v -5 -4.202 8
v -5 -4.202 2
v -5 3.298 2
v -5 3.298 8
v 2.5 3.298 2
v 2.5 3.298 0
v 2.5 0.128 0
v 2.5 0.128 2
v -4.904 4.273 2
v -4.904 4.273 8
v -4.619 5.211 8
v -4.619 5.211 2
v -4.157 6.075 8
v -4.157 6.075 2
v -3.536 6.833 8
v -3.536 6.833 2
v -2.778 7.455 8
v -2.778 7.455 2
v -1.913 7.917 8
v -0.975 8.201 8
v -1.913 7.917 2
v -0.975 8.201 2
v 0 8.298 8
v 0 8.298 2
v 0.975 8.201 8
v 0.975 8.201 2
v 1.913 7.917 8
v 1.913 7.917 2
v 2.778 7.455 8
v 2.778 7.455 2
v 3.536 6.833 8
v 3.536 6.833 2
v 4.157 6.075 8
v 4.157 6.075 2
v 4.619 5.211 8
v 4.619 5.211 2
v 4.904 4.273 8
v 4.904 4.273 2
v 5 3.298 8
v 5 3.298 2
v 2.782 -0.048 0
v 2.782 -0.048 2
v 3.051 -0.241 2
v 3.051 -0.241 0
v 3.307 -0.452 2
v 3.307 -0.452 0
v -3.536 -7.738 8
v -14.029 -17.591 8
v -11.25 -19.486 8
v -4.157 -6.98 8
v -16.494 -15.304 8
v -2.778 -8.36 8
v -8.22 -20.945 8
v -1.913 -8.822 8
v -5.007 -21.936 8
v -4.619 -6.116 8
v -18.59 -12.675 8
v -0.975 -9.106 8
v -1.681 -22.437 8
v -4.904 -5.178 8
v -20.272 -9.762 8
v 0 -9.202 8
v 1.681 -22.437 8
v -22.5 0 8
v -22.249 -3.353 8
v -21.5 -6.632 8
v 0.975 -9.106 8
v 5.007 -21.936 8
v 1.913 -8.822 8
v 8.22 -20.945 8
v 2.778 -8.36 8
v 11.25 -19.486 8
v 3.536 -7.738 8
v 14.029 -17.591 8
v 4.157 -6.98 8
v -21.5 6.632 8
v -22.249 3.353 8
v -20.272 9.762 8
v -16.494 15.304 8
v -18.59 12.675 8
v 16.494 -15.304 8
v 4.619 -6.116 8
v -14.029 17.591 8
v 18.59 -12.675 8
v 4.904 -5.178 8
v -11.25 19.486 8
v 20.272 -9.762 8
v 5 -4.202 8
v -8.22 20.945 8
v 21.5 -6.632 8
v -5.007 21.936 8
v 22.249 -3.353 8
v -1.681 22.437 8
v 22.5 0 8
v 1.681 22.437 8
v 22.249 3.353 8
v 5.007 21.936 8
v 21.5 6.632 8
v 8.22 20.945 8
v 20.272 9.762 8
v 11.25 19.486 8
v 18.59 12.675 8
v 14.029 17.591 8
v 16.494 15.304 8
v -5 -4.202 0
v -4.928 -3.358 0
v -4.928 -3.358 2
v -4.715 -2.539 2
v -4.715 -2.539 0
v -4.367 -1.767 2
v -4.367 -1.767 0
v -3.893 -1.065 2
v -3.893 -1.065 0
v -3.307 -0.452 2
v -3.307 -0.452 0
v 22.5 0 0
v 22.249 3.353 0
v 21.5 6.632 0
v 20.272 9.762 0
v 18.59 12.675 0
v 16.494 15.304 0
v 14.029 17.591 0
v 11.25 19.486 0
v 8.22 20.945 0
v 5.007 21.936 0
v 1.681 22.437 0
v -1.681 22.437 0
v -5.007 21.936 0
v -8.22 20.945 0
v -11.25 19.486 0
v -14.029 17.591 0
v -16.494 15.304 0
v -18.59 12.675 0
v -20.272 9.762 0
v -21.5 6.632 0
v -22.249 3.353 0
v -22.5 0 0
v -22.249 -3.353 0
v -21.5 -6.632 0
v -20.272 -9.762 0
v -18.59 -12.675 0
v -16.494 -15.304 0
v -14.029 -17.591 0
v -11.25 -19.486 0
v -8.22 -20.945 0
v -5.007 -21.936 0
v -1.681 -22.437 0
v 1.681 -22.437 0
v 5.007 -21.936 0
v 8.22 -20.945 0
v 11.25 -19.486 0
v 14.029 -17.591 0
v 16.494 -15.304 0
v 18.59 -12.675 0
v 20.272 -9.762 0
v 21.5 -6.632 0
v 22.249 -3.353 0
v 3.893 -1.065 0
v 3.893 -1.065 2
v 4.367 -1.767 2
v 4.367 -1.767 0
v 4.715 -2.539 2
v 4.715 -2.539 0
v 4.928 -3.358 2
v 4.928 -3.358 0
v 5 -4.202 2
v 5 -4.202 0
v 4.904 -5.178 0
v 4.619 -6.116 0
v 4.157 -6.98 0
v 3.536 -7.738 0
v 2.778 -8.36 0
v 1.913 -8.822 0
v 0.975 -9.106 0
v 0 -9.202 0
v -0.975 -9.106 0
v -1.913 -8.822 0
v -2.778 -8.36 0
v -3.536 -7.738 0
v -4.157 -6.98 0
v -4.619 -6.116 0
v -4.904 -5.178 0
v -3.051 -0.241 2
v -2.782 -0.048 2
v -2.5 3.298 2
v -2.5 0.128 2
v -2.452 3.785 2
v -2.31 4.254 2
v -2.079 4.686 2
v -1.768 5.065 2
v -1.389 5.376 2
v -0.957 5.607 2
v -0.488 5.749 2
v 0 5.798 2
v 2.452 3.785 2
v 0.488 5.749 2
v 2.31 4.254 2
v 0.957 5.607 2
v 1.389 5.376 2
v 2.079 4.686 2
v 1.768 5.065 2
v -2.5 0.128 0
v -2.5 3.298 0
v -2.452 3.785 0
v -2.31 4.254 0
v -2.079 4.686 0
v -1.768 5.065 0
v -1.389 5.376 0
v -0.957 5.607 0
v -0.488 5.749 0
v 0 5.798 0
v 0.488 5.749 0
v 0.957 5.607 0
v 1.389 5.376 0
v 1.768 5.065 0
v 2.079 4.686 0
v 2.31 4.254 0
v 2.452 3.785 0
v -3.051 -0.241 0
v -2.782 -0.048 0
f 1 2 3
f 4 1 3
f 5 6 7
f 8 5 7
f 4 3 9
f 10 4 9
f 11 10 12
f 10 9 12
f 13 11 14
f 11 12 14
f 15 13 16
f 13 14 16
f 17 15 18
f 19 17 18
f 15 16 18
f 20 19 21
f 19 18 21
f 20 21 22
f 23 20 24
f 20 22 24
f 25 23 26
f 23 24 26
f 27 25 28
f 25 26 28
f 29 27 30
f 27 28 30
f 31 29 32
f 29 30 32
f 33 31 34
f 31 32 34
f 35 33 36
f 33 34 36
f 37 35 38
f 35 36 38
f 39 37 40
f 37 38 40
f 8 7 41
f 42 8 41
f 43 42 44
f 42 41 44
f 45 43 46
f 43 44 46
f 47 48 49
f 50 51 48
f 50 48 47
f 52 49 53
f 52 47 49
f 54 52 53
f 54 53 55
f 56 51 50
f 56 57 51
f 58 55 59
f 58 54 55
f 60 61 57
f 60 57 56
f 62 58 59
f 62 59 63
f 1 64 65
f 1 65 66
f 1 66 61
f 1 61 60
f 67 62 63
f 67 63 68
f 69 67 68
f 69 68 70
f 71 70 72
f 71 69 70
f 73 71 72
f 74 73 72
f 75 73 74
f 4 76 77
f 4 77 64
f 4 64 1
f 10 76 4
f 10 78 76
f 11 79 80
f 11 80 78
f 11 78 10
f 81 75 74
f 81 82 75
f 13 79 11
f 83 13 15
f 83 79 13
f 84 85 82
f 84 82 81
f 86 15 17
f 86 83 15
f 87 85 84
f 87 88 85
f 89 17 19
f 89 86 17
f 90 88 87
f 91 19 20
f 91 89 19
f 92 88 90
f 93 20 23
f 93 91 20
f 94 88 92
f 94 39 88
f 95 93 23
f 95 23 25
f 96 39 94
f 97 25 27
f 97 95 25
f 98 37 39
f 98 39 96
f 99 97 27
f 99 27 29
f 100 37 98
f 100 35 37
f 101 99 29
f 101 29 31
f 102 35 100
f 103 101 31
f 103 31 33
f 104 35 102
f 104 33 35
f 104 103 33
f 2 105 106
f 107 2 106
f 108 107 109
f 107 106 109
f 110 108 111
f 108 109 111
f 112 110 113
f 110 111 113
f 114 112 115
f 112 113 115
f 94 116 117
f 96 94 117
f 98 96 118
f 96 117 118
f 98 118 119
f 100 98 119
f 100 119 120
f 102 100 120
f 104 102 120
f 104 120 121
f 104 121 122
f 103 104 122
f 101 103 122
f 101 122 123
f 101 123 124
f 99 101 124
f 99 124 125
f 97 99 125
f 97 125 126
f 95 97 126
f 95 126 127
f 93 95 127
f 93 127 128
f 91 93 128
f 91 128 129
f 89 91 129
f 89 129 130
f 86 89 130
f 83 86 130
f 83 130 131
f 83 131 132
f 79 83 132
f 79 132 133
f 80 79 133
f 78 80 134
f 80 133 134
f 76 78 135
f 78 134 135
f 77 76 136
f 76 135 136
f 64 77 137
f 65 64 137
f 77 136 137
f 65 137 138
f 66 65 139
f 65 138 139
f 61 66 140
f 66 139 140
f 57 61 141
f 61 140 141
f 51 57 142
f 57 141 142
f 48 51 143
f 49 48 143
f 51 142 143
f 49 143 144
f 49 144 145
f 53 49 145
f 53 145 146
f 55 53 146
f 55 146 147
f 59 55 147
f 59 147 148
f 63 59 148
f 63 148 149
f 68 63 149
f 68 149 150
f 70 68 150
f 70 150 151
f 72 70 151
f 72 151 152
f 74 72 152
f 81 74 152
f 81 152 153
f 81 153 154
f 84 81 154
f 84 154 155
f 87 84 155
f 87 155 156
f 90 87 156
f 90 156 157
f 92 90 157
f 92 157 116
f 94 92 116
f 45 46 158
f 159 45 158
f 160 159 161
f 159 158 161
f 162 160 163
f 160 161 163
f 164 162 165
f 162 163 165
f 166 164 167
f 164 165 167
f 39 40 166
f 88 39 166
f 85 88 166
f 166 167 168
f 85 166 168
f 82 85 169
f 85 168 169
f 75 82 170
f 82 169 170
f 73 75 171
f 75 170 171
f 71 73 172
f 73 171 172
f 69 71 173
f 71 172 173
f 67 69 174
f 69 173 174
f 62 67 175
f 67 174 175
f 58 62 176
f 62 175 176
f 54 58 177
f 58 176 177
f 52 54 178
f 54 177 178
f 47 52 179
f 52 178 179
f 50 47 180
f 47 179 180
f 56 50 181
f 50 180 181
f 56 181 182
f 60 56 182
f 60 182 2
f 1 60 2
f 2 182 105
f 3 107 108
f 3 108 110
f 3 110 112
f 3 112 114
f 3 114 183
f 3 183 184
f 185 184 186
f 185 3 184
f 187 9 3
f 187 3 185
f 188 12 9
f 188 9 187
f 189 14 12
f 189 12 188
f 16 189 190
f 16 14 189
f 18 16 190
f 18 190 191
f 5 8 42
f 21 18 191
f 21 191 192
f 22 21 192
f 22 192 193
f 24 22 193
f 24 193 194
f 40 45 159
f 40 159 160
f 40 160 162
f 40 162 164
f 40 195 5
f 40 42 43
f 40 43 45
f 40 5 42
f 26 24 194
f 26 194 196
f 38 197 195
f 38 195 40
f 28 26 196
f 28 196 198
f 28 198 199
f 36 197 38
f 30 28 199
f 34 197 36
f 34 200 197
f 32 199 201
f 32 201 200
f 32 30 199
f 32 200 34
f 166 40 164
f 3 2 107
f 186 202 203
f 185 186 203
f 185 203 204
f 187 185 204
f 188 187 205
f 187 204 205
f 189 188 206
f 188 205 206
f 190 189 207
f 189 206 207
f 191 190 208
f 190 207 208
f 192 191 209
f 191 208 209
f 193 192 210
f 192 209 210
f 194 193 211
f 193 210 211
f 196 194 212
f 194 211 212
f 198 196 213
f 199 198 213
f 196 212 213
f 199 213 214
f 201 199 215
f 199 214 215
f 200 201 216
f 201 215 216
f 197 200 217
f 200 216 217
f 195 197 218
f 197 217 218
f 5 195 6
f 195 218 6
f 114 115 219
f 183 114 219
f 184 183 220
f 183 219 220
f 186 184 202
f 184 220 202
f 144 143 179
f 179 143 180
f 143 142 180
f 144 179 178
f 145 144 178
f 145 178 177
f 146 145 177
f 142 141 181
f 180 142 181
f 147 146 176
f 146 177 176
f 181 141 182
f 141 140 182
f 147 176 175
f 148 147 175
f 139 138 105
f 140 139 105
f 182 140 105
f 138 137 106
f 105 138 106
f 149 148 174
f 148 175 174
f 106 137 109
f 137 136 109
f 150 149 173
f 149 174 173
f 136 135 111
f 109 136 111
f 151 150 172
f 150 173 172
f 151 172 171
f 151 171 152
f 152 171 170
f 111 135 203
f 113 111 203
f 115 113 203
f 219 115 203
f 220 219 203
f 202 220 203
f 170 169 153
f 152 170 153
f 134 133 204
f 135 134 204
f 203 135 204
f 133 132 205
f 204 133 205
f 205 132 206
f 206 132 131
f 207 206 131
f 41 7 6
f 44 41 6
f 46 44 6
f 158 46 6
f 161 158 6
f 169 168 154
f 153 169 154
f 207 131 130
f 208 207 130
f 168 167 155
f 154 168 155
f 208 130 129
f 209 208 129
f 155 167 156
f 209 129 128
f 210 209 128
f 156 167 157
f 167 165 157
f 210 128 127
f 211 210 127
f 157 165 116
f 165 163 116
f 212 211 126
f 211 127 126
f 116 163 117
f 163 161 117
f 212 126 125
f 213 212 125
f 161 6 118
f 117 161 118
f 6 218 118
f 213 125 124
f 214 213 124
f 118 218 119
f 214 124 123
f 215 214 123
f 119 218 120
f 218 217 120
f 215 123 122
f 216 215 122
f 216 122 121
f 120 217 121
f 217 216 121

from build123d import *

# Parameters (mm, degrees)
F0_R     = 22.5
F1_DEPTH = 2
F2_DEPTH = 8


with BuildPart() as f1:
    # F0 (on Top) → F1 (new body)
    with BuildSketch(Plane.XY):
        Circle(F0_R)
        with BuildLine():
            Line((5, 3.297524), (5, -4.202476))
            ThreePointArc((5, -4.202476), (0, -9.202476), (-5, -4.202476))
            Line((-5, -4.202476), (-5, 3.297524))
            ThreePointArc((-5, 3.297524), (0, 8.297524), (5, 3.297524))
        make_face(mode=Mode.SUBTRACT)
        with BuildLine():
            ThreePointArc((-5, -4.202476), (-4.557189, -2.145287), (-3.307189, -0.452476))
            ThreePointArc((-3.307189, -0.452476), (-4.557189, 1.240335), (-5, 3.297524))
            Line((-5, 3.297524), (-5, -4.202476))
        make_face()
        with BuildLine():
            ThreePointArc((-2.5, 3.297524), (0, 5.797524), (2.5, 3.297524))
            Line((2.5, 3.297524), (2.5, 0.127651))
            ThreePointArc((2.5, 0.127651), (2.918047, -0.142303), (3.307189, -0.452476))
            ThreePointArc((3.307189, -0.452476), (4.557189, 1.240335), (5, 3.297524))
            ThreePointArc((5, 3.297524), (0, 8.297524), (-5, 3.297524))
            ThreePointArc((-5, 3.297524), (-4.557189, 1.240335), (-3.307189, -0.452476))
            ThreePointArc((-3.307189, -0.452476), (-2.918047, -0.142303), (-2.5, 0.127651))
            Line((-2.5, 0.127651), (-2.5, 3.297524))
        make_face()
        with BuildLine():
            ThreePointArc((5, 3.297524), (4.557189, 1.240335), (3.307189, -0.452476))
            ThreePointArc((3.307189, -0.452476), (4.557189, -2.145287), (5, -4.202476))
            Line((5, -4.202476), (5, 3.297524))
        make_face()
    extrude(amount=F1_DEPTH)

    # F0 (on Top) → F2 (join)
    with BuildSketch(Plane.XY):
        Circle(F0_R)
        with BuildLine():
            Line((5, 3.297524), (5, -4.202476))
            ThreePointArc((5, -4.202476), (0, -9.202476), (-5, -4.202476))
            Line((-5, -4.202476), (-5, 3.297524))
            ThreePointArc((-5, 3.297524), (0, 8.297524), (5, 3.297524))
        make_face(mode=Mode.SUBTRACT)
    extrude(amount=F2_DEPTH)


solid = f1.part
